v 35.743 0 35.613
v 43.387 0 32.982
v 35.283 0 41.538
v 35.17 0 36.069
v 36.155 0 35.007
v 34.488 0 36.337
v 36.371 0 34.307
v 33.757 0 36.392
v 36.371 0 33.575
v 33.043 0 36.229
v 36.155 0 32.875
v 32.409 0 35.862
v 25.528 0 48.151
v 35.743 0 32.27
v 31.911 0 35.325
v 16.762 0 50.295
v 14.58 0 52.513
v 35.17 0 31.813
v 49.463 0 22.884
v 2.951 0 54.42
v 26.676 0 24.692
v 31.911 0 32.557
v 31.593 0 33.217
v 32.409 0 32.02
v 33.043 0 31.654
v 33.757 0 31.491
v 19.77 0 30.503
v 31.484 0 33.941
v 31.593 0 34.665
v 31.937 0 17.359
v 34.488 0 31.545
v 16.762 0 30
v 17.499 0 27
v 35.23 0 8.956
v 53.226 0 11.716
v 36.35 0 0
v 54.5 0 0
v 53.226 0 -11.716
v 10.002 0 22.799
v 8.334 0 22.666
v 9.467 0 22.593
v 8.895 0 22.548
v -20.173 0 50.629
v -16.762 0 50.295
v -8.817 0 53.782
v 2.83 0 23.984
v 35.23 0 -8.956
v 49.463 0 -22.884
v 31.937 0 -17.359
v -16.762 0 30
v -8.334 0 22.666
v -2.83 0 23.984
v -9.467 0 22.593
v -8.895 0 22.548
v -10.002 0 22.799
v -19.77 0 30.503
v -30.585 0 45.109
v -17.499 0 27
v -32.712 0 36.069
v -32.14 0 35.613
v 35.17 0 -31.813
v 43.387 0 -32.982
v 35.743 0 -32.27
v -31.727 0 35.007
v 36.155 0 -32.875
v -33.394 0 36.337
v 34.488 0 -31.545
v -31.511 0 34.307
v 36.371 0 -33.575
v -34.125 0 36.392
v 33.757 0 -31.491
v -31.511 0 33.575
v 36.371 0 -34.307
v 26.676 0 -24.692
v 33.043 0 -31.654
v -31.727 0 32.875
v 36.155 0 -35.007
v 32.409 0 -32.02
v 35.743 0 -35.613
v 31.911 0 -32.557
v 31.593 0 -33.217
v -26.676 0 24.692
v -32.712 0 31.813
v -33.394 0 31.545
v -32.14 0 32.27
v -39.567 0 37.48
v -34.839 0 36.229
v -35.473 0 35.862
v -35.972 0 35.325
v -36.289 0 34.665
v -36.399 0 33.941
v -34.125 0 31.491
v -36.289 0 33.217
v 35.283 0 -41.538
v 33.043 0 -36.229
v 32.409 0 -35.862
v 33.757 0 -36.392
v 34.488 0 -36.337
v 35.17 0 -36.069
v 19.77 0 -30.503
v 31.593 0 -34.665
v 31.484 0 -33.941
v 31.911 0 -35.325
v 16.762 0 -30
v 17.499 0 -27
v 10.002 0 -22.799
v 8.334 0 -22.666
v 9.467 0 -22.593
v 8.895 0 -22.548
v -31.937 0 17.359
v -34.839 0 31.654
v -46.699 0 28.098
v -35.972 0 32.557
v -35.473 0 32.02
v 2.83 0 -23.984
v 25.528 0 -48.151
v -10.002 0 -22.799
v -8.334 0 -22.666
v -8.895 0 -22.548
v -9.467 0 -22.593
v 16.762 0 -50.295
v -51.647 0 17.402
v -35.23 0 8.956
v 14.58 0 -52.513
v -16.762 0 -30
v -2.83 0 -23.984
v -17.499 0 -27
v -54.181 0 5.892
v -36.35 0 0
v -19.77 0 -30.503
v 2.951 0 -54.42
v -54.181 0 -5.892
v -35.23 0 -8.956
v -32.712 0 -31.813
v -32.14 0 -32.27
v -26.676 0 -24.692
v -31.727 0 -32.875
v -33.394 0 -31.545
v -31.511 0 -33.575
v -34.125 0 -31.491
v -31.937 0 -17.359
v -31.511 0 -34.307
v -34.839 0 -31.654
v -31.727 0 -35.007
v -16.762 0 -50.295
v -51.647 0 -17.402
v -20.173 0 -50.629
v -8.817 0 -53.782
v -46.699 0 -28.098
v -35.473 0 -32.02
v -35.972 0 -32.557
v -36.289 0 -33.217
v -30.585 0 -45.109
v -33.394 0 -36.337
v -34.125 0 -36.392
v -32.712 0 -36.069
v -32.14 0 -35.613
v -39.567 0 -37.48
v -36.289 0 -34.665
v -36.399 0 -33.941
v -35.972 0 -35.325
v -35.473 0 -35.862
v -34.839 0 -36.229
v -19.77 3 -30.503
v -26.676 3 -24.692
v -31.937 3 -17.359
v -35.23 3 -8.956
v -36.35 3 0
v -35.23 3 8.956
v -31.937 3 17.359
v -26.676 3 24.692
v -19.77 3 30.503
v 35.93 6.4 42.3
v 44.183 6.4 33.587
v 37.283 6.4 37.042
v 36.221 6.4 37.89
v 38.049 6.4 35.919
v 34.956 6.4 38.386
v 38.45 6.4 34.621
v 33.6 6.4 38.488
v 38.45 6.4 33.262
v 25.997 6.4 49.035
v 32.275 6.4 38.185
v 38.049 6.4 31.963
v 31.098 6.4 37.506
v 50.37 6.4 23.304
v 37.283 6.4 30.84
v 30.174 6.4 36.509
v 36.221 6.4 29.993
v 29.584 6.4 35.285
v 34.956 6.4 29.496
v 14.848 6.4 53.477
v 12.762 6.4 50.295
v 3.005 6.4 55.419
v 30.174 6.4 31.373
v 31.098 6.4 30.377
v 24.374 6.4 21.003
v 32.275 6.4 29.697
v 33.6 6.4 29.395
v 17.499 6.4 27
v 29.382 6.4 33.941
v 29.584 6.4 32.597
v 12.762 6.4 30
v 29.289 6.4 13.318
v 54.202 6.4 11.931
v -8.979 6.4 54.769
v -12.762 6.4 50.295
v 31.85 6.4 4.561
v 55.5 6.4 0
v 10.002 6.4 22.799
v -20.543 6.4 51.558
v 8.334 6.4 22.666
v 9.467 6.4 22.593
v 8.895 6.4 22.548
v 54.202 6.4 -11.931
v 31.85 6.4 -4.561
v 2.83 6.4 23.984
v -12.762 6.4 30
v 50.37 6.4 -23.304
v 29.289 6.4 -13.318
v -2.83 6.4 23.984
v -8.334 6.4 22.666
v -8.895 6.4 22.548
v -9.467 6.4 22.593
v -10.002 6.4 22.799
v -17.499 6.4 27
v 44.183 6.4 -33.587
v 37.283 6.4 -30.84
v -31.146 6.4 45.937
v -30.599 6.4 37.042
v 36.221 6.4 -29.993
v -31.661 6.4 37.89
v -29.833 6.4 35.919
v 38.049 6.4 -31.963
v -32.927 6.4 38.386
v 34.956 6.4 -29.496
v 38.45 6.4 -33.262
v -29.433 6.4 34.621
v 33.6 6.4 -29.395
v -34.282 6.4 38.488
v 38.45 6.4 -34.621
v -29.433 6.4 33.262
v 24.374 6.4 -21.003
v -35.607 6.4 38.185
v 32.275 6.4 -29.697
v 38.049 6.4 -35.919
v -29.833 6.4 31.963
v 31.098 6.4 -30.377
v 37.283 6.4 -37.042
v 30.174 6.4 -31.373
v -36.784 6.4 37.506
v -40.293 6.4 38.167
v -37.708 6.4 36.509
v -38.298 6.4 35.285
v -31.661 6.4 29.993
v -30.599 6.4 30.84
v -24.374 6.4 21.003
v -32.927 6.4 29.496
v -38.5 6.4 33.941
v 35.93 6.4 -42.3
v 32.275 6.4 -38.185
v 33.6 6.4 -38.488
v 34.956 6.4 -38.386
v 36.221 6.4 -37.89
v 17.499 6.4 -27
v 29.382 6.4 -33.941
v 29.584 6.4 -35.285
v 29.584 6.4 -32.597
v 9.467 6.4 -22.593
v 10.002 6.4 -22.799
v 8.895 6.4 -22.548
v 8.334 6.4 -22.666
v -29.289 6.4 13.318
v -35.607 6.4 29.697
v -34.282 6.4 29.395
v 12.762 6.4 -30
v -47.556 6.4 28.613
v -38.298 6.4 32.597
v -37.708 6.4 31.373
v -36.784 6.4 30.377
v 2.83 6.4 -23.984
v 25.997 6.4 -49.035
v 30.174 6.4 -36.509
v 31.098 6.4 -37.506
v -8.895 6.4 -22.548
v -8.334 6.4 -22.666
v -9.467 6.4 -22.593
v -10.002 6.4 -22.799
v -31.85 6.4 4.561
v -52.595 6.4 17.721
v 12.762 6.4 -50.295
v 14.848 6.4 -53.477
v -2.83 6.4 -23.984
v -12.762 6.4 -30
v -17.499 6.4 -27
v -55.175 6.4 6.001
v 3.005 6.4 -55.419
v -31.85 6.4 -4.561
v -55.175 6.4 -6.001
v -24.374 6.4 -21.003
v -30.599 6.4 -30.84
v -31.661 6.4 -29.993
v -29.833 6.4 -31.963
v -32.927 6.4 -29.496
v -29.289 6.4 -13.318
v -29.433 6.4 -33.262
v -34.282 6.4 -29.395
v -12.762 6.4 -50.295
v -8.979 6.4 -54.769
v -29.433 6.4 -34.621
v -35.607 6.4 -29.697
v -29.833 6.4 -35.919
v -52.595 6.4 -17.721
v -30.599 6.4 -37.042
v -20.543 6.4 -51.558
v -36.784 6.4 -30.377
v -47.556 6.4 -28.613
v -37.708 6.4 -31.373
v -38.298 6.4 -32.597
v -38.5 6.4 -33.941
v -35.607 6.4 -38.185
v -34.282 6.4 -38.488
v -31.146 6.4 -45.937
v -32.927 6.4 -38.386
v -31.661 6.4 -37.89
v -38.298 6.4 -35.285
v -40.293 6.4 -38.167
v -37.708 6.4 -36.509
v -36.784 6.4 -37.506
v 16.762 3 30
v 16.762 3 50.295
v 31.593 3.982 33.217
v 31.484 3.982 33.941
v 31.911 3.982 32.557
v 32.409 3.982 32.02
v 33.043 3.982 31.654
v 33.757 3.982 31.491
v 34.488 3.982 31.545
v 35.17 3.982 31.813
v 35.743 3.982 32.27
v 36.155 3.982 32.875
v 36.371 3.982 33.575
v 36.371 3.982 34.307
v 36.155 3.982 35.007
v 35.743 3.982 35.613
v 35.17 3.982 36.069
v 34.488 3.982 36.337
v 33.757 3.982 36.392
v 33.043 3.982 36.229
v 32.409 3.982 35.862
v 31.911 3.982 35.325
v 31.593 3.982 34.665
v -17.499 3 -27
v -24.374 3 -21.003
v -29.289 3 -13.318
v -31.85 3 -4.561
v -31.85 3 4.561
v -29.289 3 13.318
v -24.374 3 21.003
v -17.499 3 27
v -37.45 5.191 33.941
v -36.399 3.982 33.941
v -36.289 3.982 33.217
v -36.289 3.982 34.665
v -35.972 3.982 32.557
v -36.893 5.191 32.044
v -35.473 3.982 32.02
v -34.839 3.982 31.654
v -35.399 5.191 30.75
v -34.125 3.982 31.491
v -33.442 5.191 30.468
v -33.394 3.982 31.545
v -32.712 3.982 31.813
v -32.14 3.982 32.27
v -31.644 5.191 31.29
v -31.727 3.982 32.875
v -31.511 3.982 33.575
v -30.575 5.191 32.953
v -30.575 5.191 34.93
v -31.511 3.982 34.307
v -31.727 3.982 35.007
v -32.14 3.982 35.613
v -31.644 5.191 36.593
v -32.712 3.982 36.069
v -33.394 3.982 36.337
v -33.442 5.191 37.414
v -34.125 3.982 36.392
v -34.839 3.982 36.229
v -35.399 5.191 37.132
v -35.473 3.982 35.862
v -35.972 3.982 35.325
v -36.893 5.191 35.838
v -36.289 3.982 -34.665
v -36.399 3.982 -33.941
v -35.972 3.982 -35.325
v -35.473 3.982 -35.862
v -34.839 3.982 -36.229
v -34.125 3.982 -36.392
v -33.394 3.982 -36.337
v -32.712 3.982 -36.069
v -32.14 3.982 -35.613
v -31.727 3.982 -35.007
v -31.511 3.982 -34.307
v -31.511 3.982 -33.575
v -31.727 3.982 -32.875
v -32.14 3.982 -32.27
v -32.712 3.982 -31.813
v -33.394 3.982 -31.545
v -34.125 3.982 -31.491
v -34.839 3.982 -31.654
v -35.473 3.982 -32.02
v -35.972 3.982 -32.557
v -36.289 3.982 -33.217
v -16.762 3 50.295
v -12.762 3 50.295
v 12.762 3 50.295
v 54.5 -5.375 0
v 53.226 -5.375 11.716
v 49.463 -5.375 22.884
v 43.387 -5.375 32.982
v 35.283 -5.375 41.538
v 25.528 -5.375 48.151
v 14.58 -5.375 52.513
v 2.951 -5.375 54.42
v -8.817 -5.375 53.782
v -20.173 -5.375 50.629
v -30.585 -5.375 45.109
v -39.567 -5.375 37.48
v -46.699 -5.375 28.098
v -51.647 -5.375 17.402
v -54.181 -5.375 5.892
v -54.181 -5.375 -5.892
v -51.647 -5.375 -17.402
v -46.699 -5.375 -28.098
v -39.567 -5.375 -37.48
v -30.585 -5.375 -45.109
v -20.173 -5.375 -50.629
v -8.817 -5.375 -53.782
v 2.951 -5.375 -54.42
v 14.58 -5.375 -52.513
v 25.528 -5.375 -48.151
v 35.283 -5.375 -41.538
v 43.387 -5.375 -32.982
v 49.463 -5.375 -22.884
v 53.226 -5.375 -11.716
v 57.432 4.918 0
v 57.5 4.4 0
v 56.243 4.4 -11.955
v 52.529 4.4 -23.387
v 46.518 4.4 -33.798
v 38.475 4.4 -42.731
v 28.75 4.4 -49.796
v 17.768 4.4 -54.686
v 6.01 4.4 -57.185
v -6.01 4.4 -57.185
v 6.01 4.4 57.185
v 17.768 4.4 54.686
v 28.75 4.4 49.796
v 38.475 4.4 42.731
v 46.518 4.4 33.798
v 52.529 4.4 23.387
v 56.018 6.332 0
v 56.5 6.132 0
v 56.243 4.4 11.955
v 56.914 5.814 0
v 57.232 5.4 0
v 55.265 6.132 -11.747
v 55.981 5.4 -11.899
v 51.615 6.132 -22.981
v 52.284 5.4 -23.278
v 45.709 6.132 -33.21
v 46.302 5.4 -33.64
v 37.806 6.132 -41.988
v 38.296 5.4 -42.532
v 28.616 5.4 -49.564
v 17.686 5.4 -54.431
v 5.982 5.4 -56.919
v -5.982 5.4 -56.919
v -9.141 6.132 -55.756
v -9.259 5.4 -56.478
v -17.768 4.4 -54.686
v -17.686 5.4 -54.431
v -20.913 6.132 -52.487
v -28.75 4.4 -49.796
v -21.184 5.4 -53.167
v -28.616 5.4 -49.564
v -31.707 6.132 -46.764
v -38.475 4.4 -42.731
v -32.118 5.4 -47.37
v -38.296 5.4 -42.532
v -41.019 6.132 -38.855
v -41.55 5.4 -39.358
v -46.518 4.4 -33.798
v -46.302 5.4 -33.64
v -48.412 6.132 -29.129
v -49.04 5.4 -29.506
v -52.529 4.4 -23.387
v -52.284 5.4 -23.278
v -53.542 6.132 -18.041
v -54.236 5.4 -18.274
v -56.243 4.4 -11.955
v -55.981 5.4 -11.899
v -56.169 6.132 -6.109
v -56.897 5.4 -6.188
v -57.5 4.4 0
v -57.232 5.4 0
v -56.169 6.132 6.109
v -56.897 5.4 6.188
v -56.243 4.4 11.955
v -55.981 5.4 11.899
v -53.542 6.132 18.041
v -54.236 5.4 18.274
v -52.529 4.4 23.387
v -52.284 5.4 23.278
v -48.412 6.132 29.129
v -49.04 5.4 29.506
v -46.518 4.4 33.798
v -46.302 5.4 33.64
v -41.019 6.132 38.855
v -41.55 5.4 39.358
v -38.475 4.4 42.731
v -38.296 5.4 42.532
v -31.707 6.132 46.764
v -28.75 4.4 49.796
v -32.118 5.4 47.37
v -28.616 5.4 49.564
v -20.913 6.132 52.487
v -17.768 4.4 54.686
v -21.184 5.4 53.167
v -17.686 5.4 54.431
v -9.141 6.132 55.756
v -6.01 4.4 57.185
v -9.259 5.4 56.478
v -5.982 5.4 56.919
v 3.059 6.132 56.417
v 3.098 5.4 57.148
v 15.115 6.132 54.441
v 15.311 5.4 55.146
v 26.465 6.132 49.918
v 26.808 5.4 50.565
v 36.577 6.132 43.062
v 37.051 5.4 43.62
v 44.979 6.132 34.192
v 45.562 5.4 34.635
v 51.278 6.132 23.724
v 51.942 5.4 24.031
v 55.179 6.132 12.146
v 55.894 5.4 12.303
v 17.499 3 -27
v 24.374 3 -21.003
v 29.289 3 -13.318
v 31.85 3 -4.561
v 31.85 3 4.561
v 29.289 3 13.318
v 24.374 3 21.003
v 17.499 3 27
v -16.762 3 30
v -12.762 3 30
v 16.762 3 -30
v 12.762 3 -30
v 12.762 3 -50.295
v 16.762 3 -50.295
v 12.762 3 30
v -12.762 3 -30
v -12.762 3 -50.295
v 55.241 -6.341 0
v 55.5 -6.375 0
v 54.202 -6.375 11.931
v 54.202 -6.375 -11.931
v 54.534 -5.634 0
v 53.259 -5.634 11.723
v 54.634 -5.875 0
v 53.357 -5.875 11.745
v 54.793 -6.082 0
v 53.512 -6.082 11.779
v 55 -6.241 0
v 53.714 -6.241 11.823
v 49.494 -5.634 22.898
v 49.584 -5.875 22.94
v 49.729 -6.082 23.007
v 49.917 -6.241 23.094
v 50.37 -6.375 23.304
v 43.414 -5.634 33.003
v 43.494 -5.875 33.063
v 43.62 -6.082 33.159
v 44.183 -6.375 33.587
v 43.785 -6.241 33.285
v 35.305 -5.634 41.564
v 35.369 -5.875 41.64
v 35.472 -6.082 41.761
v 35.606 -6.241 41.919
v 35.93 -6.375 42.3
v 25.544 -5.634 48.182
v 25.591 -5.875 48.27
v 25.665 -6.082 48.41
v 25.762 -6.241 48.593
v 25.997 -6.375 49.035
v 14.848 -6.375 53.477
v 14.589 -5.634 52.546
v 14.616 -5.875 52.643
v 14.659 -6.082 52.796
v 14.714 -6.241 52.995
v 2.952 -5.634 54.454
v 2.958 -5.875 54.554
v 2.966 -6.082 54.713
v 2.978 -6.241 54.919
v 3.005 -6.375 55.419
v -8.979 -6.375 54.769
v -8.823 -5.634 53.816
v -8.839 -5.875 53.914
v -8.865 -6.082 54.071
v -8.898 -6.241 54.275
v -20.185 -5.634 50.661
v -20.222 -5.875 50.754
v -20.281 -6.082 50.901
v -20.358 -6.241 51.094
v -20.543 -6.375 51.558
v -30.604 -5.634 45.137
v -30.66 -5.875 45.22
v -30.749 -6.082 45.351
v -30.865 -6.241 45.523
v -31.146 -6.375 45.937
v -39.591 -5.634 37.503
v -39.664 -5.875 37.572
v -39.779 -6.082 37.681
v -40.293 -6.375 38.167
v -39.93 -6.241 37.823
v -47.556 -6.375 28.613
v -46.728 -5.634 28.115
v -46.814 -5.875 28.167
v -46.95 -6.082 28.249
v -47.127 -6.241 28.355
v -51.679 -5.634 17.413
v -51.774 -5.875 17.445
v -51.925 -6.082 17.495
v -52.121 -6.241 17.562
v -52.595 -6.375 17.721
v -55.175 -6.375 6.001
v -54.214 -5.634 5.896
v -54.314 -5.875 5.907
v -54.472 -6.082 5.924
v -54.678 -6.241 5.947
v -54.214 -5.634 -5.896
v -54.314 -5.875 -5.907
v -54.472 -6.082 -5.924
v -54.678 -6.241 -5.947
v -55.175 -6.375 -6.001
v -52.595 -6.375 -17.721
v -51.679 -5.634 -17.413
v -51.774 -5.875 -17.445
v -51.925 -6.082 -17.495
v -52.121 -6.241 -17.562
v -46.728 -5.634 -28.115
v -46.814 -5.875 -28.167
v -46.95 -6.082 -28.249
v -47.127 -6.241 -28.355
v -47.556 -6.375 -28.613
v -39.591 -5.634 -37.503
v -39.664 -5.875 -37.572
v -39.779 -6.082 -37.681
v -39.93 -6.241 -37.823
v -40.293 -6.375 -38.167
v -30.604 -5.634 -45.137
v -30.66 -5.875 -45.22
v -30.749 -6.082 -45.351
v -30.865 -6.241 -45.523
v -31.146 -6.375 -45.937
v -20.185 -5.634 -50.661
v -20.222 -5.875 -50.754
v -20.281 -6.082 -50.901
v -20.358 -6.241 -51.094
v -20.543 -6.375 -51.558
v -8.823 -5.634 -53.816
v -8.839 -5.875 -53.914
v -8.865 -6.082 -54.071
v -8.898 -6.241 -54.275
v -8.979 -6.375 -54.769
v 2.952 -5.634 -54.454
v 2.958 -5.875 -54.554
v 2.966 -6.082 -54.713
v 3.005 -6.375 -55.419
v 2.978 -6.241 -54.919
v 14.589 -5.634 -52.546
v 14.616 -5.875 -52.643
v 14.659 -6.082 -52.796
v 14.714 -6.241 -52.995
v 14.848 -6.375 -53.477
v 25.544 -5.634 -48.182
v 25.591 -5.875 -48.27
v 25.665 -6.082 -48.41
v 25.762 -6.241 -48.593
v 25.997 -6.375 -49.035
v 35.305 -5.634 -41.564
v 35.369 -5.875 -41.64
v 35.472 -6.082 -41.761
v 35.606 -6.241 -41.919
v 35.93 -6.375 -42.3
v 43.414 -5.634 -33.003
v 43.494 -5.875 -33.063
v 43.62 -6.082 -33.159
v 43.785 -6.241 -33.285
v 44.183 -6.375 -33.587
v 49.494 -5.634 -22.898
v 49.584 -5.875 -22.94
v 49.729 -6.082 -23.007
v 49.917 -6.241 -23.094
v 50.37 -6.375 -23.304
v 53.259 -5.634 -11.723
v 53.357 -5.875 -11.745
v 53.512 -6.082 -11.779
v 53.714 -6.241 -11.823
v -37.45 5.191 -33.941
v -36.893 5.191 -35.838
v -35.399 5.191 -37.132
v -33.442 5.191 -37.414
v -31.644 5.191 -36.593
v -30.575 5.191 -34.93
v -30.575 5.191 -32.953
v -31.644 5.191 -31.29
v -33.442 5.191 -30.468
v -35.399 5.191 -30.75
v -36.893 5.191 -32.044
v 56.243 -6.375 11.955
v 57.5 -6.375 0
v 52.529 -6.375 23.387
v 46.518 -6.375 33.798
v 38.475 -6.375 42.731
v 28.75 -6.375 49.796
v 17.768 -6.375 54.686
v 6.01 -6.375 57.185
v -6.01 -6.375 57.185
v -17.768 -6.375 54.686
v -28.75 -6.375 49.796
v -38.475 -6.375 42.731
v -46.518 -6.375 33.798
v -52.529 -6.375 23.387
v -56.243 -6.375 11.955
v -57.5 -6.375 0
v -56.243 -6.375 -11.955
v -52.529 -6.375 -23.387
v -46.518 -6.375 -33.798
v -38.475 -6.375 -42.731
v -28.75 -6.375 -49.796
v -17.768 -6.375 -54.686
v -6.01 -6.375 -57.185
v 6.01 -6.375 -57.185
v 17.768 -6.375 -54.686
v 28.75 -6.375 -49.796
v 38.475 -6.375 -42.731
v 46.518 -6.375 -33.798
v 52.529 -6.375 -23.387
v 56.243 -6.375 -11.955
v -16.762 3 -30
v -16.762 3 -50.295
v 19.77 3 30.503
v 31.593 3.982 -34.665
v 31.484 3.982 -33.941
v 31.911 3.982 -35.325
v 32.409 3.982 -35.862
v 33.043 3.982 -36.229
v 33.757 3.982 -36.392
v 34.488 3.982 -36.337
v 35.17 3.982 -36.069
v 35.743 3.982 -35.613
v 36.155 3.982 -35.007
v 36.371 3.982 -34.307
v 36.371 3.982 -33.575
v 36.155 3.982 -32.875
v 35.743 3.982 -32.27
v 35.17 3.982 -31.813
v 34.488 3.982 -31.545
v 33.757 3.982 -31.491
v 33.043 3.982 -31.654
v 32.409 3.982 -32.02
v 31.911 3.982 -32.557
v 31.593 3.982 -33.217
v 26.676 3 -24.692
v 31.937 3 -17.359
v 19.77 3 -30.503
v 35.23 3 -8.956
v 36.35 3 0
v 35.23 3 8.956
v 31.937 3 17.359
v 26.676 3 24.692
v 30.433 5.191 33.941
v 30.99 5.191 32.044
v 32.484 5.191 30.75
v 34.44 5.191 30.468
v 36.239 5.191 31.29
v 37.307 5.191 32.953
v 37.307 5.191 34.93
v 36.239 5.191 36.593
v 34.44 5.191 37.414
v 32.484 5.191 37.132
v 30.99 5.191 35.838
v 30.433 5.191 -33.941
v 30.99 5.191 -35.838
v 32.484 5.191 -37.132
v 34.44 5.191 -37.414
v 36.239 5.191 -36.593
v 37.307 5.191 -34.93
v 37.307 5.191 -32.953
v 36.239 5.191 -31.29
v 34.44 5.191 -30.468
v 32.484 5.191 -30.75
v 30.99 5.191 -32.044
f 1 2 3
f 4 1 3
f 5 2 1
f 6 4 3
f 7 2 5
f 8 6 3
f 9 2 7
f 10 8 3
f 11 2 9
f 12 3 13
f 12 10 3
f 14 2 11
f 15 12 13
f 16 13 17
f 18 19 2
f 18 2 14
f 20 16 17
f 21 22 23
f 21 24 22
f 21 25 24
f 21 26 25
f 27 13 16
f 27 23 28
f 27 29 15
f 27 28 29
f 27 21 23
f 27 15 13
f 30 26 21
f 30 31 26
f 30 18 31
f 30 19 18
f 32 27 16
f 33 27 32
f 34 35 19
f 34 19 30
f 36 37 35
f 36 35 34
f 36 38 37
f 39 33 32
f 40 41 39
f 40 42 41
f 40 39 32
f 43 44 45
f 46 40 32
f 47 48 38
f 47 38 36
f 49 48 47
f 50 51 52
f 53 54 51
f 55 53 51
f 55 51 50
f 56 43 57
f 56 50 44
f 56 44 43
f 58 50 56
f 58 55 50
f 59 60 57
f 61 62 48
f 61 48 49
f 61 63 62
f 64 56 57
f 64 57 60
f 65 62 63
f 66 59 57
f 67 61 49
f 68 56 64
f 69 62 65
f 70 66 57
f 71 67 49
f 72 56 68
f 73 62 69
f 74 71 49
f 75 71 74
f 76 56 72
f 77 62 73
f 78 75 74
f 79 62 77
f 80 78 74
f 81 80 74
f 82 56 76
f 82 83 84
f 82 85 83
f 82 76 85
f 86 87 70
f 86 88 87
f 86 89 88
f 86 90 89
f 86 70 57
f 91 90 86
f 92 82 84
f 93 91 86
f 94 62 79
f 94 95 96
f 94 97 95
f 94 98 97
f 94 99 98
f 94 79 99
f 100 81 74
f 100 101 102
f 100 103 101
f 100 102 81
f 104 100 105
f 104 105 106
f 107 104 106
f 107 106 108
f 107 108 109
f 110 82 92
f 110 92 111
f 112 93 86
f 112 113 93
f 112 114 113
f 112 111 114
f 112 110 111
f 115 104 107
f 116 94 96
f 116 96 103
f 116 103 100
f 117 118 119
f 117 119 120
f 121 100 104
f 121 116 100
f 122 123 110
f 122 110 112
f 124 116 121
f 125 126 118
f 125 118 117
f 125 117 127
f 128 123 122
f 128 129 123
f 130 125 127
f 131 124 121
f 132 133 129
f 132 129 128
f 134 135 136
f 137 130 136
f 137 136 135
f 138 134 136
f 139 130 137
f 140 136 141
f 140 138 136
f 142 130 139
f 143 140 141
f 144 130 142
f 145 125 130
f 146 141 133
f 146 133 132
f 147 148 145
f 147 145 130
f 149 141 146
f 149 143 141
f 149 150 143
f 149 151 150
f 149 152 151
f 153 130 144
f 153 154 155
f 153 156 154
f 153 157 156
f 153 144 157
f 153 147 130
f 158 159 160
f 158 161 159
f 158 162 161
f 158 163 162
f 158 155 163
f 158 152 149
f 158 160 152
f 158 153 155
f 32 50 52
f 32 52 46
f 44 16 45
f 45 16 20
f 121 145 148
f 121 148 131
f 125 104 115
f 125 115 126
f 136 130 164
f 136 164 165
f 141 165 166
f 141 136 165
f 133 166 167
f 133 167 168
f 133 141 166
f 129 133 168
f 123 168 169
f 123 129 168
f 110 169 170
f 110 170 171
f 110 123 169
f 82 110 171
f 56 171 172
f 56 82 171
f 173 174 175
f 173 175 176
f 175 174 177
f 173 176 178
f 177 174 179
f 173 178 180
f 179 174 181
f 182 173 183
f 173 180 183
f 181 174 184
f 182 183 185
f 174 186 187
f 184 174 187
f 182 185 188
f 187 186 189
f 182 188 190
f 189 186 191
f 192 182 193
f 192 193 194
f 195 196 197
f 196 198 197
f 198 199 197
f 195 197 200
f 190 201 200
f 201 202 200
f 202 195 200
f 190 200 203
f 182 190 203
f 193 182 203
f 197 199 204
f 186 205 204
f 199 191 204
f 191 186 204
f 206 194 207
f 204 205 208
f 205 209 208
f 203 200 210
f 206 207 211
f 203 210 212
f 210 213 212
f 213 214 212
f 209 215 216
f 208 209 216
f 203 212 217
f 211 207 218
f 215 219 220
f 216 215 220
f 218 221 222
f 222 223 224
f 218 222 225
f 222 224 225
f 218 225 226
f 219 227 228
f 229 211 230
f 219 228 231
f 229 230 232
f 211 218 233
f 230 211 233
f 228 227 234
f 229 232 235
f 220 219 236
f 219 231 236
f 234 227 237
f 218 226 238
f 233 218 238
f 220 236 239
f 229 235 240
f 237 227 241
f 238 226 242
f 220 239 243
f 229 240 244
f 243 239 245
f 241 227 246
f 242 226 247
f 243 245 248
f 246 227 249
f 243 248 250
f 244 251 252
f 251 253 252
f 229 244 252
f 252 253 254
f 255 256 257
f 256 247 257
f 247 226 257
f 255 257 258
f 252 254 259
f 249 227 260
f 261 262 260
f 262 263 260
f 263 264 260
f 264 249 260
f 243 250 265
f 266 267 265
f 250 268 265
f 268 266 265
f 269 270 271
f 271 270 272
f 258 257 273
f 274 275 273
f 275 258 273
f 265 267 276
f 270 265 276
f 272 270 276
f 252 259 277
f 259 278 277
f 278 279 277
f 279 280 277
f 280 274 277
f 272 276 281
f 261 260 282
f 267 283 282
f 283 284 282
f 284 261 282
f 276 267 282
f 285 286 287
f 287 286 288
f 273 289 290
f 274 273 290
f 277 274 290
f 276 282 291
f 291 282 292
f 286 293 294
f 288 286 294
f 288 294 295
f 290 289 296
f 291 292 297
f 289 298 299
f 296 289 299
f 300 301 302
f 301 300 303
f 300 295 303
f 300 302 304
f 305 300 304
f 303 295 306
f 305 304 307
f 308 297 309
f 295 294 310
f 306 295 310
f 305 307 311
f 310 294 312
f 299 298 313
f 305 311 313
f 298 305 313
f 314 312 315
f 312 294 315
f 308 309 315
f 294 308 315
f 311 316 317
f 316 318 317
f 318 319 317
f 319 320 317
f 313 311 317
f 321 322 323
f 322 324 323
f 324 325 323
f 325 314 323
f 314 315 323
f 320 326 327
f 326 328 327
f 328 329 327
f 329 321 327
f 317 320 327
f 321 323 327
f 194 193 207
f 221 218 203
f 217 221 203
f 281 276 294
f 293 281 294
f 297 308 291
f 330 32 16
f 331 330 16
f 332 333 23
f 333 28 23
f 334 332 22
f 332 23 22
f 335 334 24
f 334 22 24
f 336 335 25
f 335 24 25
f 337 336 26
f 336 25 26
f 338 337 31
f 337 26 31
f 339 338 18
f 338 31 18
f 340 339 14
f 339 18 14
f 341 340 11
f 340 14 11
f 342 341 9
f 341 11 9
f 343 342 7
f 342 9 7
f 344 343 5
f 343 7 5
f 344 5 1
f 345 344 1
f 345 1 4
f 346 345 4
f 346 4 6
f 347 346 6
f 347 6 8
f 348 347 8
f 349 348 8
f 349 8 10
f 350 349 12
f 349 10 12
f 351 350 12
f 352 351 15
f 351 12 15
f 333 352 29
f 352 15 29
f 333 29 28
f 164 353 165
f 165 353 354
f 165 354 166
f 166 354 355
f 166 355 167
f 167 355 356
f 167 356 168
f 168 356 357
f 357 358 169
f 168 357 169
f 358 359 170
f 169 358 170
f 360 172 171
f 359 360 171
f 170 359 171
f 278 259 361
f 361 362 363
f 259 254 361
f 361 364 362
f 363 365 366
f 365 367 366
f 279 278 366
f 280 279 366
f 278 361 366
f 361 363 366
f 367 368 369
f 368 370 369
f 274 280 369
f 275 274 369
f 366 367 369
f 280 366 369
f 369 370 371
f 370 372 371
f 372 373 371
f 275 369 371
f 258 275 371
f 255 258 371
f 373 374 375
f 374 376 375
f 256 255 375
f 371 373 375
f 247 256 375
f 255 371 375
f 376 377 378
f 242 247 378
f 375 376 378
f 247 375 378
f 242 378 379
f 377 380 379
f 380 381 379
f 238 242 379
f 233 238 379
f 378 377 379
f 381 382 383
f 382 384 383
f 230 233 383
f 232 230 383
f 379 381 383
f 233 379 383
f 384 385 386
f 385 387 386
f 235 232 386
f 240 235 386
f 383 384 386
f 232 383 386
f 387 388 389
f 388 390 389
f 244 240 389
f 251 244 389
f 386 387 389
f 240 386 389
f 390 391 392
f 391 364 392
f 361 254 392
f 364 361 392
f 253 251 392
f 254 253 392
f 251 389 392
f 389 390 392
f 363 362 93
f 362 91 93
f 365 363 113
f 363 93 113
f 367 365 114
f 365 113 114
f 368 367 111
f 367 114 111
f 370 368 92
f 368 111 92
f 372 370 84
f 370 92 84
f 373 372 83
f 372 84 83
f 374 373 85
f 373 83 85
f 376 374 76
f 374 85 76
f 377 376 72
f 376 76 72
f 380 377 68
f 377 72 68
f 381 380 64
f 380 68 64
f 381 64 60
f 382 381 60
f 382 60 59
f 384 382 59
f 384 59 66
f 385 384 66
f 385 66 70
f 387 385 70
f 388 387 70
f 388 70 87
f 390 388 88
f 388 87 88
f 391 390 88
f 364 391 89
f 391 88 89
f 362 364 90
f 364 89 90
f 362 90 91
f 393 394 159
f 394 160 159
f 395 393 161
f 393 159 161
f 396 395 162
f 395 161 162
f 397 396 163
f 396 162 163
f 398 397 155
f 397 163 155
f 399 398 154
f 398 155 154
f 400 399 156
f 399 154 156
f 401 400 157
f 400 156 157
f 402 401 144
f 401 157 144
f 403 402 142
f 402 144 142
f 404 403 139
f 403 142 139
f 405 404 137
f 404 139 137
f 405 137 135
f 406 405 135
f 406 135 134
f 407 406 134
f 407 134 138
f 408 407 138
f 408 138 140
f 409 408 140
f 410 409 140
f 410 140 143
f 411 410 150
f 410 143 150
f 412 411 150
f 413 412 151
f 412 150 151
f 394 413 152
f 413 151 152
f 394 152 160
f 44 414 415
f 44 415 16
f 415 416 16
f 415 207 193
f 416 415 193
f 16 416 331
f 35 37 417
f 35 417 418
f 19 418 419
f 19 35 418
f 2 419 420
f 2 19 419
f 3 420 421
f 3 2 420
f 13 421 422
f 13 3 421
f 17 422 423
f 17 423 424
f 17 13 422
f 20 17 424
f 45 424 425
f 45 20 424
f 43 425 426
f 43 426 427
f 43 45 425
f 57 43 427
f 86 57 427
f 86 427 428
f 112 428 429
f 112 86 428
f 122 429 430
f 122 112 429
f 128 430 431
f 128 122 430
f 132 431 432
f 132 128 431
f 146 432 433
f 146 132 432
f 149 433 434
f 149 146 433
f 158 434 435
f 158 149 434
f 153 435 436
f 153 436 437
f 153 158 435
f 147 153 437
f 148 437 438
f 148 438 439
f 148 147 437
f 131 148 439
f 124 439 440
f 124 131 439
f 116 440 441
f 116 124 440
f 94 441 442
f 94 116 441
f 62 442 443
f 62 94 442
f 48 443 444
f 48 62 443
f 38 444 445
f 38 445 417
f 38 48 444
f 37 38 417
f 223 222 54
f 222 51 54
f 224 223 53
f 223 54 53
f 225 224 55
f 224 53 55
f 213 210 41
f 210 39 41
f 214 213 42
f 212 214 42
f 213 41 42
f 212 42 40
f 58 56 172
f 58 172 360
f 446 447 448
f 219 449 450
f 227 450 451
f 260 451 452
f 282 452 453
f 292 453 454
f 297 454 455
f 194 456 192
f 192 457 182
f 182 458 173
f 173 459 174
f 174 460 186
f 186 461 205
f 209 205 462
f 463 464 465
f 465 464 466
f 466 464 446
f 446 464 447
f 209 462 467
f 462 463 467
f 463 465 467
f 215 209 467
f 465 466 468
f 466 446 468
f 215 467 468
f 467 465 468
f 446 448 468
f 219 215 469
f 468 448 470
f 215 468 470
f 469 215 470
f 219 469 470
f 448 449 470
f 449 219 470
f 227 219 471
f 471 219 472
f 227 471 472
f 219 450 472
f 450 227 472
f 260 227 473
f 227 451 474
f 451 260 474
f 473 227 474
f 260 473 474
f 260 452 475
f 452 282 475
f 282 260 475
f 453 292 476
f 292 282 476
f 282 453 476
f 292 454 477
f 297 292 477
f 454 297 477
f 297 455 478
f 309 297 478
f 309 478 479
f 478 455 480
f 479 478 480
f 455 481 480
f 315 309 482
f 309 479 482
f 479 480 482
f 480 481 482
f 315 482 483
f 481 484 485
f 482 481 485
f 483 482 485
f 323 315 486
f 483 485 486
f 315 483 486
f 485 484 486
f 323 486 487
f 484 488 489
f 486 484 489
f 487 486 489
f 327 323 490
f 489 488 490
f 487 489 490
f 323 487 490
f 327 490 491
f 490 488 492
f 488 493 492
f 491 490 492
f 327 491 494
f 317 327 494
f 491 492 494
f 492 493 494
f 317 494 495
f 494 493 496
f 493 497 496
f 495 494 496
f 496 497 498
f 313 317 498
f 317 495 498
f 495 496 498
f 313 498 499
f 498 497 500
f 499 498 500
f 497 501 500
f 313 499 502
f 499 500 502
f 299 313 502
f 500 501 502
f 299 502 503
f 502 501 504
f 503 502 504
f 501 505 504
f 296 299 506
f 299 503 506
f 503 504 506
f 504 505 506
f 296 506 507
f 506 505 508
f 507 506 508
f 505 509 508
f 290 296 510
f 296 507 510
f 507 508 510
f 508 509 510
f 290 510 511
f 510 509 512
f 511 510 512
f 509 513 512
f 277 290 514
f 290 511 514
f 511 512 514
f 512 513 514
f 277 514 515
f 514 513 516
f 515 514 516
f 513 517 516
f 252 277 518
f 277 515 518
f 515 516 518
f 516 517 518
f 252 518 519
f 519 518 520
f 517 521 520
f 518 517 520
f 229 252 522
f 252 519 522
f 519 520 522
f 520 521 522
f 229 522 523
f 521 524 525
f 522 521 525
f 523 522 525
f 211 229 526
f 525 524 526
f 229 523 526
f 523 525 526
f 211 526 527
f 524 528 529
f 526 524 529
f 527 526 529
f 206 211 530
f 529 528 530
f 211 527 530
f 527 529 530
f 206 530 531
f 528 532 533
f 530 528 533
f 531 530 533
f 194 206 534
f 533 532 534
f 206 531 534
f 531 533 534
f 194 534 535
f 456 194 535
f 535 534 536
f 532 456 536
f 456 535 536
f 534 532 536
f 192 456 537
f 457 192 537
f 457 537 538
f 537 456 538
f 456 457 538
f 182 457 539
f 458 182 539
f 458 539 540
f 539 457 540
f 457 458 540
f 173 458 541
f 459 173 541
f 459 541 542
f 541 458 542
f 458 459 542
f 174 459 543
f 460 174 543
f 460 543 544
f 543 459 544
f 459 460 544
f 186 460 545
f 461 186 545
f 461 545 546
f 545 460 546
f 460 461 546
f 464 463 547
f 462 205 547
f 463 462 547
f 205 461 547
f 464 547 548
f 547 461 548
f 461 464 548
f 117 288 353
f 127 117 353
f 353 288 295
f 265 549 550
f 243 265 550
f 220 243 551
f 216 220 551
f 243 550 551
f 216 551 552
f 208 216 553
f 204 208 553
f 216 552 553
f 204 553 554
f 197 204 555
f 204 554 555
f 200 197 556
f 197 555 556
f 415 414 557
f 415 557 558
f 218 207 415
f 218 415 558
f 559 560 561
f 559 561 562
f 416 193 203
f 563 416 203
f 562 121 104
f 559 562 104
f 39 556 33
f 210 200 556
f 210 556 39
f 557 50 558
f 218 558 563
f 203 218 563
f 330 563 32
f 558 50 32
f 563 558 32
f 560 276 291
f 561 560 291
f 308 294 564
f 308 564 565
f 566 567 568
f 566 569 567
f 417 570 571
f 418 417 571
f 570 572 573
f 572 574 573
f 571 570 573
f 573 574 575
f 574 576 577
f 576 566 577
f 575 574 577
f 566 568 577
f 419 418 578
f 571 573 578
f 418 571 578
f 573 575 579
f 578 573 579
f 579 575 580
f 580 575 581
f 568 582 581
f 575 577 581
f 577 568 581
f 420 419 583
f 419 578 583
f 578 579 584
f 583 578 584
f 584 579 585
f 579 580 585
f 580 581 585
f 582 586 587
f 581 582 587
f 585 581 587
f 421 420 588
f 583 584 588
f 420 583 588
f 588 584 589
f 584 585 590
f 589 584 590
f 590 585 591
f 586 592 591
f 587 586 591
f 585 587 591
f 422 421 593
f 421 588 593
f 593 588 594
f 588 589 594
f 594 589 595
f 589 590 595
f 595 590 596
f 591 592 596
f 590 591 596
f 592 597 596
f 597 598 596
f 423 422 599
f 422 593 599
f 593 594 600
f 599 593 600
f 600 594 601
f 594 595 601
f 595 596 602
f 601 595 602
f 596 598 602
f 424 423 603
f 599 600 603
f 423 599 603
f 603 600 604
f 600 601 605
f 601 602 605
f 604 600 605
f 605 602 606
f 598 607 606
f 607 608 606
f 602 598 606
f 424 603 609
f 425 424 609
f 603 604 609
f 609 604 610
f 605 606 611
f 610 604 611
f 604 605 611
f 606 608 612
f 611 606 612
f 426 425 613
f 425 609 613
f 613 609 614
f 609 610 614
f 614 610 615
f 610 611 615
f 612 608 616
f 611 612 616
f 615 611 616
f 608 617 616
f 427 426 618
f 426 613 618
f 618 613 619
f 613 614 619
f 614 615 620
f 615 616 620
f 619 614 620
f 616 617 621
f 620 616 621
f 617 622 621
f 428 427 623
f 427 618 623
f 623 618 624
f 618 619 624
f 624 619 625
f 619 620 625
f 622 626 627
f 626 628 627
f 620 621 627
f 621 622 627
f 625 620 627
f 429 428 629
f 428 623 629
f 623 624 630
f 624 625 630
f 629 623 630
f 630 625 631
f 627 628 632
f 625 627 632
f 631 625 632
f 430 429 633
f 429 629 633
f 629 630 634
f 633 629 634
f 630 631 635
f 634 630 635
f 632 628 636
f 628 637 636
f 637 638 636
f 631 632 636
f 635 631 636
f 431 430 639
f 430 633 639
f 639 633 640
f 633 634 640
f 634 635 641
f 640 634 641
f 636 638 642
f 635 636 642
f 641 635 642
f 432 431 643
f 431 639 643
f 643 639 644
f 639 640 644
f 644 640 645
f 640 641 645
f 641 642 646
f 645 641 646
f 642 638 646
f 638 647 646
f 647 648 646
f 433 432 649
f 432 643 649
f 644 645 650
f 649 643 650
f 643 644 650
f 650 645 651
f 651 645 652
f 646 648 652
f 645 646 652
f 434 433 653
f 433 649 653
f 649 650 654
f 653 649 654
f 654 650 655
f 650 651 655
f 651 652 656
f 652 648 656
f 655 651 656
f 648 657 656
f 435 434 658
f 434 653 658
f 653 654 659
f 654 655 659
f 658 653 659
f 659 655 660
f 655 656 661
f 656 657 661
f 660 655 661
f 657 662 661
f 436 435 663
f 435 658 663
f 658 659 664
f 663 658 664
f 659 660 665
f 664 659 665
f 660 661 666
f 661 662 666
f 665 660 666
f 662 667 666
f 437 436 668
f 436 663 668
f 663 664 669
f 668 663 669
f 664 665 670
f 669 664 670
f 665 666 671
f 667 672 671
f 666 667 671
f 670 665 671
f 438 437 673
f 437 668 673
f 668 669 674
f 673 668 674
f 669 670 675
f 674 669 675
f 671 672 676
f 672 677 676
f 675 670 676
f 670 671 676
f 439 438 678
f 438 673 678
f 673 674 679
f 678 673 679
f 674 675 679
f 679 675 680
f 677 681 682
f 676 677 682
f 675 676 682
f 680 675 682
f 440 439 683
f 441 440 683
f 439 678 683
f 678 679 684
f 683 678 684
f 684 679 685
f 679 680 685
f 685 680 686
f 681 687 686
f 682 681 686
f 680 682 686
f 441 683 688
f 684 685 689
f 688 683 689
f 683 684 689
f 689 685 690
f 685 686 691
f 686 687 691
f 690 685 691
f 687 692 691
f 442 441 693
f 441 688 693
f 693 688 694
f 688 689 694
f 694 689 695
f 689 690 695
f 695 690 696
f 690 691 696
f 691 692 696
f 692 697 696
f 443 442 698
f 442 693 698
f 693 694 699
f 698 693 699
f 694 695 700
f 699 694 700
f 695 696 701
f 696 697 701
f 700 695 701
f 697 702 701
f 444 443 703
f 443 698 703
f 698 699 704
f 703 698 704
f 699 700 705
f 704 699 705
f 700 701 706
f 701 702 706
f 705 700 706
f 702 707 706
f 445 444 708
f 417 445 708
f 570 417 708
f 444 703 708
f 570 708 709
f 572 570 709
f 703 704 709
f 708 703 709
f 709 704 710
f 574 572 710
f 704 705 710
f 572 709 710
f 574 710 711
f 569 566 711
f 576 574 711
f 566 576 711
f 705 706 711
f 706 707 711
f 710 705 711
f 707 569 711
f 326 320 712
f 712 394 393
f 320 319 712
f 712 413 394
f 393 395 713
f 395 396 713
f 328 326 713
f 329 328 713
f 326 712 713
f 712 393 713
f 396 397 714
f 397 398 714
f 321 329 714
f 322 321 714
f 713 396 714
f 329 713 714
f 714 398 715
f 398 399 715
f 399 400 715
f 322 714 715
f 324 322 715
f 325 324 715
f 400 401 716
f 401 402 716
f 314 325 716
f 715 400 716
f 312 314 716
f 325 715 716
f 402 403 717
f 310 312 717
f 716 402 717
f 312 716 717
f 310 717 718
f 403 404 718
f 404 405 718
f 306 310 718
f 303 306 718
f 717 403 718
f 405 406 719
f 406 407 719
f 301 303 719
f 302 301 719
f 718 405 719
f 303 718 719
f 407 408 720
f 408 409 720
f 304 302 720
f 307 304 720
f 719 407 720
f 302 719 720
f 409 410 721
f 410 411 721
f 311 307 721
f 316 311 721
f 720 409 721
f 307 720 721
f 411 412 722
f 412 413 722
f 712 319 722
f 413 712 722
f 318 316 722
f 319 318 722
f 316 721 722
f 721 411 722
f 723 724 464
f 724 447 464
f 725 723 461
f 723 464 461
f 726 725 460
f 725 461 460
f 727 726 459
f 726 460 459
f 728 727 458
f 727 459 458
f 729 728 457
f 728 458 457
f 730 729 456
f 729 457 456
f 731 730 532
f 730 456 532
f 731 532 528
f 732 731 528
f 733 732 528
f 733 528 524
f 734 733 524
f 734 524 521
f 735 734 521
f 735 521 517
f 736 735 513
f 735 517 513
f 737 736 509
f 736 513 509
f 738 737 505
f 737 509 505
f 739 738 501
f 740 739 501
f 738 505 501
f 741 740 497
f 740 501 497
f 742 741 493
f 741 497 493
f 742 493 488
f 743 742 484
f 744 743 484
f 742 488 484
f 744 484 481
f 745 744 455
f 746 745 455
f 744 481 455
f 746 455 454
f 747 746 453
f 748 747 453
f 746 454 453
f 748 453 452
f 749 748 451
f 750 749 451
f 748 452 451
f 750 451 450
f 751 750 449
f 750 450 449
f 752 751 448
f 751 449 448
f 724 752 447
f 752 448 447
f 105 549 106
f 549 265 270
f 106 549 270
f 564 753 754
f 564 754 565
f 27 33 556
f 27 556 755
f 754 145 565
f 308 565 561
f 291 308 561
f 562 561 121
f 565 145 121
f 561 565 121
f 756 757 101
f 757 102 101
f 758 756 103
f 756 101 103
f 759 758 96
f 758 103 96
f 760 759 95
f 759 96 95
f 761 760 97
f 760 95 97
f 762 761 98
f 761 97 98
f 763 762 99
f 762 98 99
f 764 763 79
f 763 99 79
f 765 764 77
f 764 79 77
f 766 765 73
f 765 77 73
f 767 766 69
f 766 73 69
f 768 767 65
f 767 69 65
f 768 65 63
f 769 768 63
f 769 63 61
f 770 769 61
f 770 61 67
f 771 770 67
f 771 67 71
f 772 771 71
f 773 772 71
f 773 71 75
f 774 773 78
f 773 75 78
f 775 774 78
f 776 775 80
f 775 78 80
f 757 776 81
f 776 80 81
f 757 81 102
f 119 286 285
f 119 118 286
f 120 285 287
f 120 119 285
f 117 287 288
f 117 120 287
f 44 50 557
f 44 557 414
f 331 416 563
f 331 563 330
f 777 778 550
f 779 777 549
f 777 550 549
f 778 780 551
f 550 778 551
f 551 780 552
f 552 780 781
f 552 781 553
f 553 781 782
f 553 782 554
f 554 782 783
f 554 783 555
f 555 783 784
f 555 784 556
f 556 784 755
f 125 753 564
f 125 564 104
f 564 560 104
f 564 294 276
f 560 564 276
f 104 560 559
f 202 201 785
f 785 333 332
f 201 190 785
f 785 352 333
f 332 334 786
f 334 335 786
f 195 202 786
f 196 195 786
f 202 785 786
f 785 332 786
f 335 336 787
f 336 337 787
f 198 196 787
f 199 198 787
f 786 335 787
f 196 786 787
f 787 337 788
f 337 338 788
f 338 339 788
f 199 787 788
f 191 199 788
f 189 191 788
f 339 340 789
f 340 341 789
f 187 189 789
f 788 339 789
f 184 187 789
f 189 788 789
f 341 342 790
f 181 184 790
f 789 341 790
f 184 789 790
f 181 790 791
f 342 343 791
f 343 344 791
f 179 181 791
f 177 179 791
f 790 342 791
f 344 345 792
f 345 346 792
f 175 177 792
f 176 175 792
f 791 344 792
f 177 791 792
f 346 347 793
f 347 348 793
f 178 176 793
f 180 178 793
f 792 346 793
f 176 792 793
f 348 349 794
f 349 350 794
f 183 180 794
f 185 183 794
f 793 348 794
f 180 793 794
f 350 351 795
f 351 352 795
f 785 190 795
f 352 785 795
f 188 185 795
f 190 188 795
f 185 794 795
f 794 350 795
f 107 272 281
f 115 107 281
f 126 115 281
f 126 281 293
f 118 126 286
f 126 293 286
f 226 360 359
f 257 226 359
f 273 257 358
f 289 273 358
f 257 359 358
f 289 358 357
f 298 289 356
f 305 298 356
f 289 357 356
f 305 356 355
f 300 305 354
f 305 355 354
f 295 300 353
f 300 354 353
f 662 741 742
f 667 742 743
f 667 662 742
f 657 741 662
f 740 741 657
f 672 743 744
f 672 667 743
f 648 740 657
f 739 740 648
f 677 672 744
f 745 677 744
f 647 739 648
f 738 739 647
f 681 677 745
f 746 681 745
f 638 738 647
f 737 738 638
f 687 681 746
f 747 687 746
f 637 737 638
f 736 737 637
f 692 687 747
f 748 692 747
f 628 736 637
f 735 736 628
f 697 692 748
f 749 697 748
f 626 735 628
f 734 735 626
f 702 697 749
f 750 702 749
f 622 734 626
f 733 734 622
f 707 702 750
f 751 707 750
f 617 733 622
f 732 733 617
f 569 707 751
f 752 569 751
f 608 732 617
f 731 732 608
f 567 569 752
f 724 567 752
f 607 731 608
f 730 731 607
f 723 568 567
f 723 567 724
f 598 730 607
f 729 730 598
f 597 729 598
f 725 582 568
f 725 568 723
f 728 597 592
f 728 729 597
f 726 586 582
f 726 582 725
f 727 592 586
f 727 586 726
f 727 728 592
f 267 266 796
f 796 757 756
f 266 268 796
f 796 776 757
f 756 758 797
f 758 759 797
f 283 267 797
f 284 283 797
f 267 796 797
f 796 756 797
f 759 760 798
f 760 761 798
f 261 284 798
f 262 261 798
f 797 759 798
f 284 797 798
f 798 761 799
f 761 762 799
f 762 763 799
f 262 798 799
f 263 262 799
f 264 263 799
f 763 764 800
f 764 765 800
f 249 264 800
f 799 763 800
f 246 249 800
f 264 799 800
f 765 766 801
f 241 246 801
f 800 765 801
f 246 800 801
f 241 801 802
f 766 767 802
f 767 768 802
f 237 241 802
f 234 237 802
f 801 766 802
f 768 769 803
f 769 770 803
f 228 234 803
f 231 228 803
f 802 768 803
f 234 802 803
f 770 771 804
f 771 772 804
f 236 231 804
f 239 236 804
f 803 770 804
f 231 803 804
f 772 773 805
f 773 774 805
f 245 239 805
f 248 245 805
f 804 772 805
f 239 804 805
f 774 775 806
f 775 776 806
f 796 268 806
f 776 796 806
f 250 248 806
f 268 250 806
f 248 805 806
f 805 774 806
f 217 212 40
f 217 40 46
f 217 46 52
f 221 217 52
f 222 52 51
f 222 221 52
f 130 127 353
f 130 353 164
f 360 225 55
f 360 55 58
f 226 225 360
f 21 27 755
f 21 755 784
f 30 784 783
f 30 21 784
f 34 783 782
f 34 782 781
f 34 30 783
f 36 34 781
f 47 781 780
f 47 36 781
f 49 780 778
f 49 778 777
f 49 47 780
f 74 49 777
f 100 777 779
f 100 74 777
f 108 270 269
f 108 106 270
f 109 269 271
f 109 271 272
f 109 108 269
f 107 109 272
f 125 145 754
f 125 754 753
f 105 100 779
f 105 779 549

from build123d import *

# Parameters (mm, degrees)
SKETCH1_R                                         = 57.5
BOSS_EXTRUDE1_DEPTH                               = 6.4
SKETCH2_W                                         = 25.525
SKETCH2_H                                         = 20.295
CUT_EXTRUDE1_DEPTH                                = 7.4
SKETCH3_W                                         = 4
SKETCH3_H                                         = 20.295
CUT_EXTRUDE2_DEPTH                                = 3
CUT_EXTRUDE3_DEPTH                                = 3
SKETCH5_R                                         = 1
CUT_EXTRUDE4_DEPTH                                = 7.4
CSK_FOR_8_FLAT_HEAD_SOCKET_CAP_SCREW1_D           = 4.9149
CSK_FOR_8_FLAT_HEAD_SOCKET_CAP_SCREW1_CSINK_D     = 9.1186
CSK_FOR_8_FLAT_HEAD_SOCKET_CAP_SCREW1_CSINK_ANGLE = 82
BOSS_EXTRUDE2_DEPTH                               = 6.4
FILLET1_R                                         = 2
SKETCH10_R                                        = 57.5
SKETCH10_R_2                                      = 54.5
BOSS_EXTRUDE3_DEPTH                               = 6.375
FILLET2_R                                         = 1


with BuildPart() as part:
    # Sketch1 → Boss-Extrude1 (new body)
    with BuildSketch(Plane(origin=(0, 0, 0), x_dir=(1, 0, 0), z_dir=(0, 1, 0))):
        Circle(SKETCH1_R)
        with BuildLine():
            Line((-17.49944642, 27), (17.49944642, 27))
            ThreePointArc((17.49944642, 27), (32.175, 0), (17.49944642, -27))
            Line((17.49944642, -27), (-17.49944642, -27))
            ThreePointArc((-17.49944642, -27), (-32.175, 0), (-17.49944642, 27))
        make_face(mode=Mode.SUBTRACT)
    extrude(amount=BOSS_EXTRUDE1_DEPTH)

    # Sketch2 → Cut-Extrude1 (cut, through all)
    with BuildSketch(Plane(origin=(0, 6.4, 0), x_dir=(1, 0, 0), z_dir=(0, 1, 0))):
        with Locations((0, 40.1475)):
            Rectangle(SKETCH2_W, SKETCH2_H)
        with Locations((0, -40.1475)):
            Rectangle(SKETCH2_W, SKETCH2_H)
    extrude(amount=-CUT_EXTRUDE1_DEPTH, mode=Mode.SUBTRACT)

    # Sketch3 → Cut-Extrude2 (cut)
    with BuildSketch(Plane.XZ):
        with Locations((14.7625, 40.1475)):
            Rectangle(SKETCH3_W, SKETCH3_H)
        with Locations((-14.7625, 40.1475)):
            Rectangle(SKETCH3_W, SKETCH3_H)
        with Locations((14.7625, -40.1475)):
            Rectangle(SKETCH3_W, SKETCH3_H)
        with Locations((-14.7625, -40.1475)):
            Rectangle(SKETCH3_W, SKETCH3_H)
    extrude(amount=-CUT_EXTRUDE2_DEPTH, mode=Mode.SUBTRACT)

    # Sketch4 → Cut-Extrude3 (cut)
    with BuildSketch(Plane.XZ):
        with BuildLine():
            Line((-19.770159359, 30.503496503), (-17.49944642, 27))
            ThreePointArc((-17.49944642, 27), (-32.175, 0), (-17.49944642, -27))
            Line((-17.49944642, -27), (-19.770159359, -30.503496503))
            ThreePointArc((-19.770159359, -30.503496503), (-36.35, 0), (-19.770159359, 30.503496503))
        make_face()
        with BuildLine():
            ThreePointArc((19.770159359, 30.503496503), (36.35, 0), (19.770159359, -30.503496503))
            Line((19.770159359, -30.503496503), (17.49944642, -27))
            ThreePointArc((17.49944642, -27), (32.175, 0), (17.49944642, 27))
            Line((17.49944642, 27), (19.770159359, 30.503496503))
        make_face()
    extrude(amount=-CUT_EXTRUDE3_DEPTH, mode=Mode.SUBTRACT)

    # Sketch5 → Cut-Extrude4 (cut, through all)
    with BuildSketch(Plane.XZ):
        with Locations((-33.941125497, 33.941125497)):
            Circle(SKETCH5_R)
        with Locations((33.941125497, 33.941125497)):
            Circle(SKETCH5_R)
        with Locations((33.941125497, -33.941125497)):
            Circle(SKETCH5_R)
        with Locations((-33.941125497, -33.941125497)):
            Circle(SKETCH5_R)
    extrude(amount=-CUT_EXTRUDE4_DEPTH, mode=Mode.SUBTRACT)

    # CSK for #8 Flat Head Socket Cap Screw1 (through all)
    with Locations(Plane(origin=(0, 6.4, 0), x_dir=(1, 0, 0), z_dir=(0, 1, 0))):
        with Locations((-33.941125497, 33.941125497), (33.941125497, 33.941125497), (33.941125497, -33.941125497), (-33.941125497, -33.941125497)):
            CounterSinkHole(CSK_FOR_8_FLAT_HEAD_SOCKET_CAP_SCREW1_D / 2, CSK_FOR_8_FLAT_HEAD_SOCKET_CAP_SCREW1_CSINK_D / 2, counter_sink_angle=CSK_FOR_8_FLAT_HEAD_SOCKET_CAP_SCREW1_CSINK_ANGLE)

    # Sketch9 → Boss-Extrude2 (add)
    with BuildSketch(Plane(origin=(0, 6.4, 0), x_dir=(1, 0, 0), z_dir=(0, 1, 0))):
        with BuildLine():
            Line((-17.49944642, 27), (17.49944642, 27))
            Line((17.49944642, 27), (9.178880504, 22.337651011))
            ThreePointArc((9.178880504, 22.337651011), (0, 24.15), (-9.178880504, 22.337651011))
            Line((-9.178880504, 22.337651011), (-17.49944642, 27))
        make_face()
        with BuildLine():
            Line((17.49944642, -27), (9.178880504, -22.337651011))
            ThreePointArc((9.178880504, -22.337651011), (0, -24.15), (-9.178880504, -22.337651011))
            Line((-9.178880504, -22.337651011), (-17.49944642, -27))
            Line((-17.49944642, -27), (17.49944642, -27))
        make_face()
    extrude(amount=-BOSS_EXTRUDE2_DEPTH)

    # Fillet1
    fillet1_edges = [part.edges().sort_by_distance(p)[0] for p in [
        (9.178880504, 3.2, -22.337651011),
        (-9.178880504, 3.2, -22.337651011),
        (-9.178880504, 3.2, 22.337651011),
        (9.178880504, 3.2, 22.337651011),
        (-57.5, 6.4, 0),
    ]]
    fillet(fillet1_edges, radius=FILLET1_R)

    # Sketch10 → Boss-Extrude3 (add)
    with BuildSketch(Plane.XZ):
        Circle(SKETCH10_R)
        Circle(SKETCH10_R_2, mode=Mode.SUBTRACT)
    extrude(amount=BOSS_EXTRUDE3_DEPTH)

    # Fillet2
    fillet2_edges = [part.edges().sort_by_distance(p)[0] for p in [
        (-54.5, -6.375, 0),
    ]]
    fillet(fillet2_edges, radius=FILLET2_R)


solid = part.part
